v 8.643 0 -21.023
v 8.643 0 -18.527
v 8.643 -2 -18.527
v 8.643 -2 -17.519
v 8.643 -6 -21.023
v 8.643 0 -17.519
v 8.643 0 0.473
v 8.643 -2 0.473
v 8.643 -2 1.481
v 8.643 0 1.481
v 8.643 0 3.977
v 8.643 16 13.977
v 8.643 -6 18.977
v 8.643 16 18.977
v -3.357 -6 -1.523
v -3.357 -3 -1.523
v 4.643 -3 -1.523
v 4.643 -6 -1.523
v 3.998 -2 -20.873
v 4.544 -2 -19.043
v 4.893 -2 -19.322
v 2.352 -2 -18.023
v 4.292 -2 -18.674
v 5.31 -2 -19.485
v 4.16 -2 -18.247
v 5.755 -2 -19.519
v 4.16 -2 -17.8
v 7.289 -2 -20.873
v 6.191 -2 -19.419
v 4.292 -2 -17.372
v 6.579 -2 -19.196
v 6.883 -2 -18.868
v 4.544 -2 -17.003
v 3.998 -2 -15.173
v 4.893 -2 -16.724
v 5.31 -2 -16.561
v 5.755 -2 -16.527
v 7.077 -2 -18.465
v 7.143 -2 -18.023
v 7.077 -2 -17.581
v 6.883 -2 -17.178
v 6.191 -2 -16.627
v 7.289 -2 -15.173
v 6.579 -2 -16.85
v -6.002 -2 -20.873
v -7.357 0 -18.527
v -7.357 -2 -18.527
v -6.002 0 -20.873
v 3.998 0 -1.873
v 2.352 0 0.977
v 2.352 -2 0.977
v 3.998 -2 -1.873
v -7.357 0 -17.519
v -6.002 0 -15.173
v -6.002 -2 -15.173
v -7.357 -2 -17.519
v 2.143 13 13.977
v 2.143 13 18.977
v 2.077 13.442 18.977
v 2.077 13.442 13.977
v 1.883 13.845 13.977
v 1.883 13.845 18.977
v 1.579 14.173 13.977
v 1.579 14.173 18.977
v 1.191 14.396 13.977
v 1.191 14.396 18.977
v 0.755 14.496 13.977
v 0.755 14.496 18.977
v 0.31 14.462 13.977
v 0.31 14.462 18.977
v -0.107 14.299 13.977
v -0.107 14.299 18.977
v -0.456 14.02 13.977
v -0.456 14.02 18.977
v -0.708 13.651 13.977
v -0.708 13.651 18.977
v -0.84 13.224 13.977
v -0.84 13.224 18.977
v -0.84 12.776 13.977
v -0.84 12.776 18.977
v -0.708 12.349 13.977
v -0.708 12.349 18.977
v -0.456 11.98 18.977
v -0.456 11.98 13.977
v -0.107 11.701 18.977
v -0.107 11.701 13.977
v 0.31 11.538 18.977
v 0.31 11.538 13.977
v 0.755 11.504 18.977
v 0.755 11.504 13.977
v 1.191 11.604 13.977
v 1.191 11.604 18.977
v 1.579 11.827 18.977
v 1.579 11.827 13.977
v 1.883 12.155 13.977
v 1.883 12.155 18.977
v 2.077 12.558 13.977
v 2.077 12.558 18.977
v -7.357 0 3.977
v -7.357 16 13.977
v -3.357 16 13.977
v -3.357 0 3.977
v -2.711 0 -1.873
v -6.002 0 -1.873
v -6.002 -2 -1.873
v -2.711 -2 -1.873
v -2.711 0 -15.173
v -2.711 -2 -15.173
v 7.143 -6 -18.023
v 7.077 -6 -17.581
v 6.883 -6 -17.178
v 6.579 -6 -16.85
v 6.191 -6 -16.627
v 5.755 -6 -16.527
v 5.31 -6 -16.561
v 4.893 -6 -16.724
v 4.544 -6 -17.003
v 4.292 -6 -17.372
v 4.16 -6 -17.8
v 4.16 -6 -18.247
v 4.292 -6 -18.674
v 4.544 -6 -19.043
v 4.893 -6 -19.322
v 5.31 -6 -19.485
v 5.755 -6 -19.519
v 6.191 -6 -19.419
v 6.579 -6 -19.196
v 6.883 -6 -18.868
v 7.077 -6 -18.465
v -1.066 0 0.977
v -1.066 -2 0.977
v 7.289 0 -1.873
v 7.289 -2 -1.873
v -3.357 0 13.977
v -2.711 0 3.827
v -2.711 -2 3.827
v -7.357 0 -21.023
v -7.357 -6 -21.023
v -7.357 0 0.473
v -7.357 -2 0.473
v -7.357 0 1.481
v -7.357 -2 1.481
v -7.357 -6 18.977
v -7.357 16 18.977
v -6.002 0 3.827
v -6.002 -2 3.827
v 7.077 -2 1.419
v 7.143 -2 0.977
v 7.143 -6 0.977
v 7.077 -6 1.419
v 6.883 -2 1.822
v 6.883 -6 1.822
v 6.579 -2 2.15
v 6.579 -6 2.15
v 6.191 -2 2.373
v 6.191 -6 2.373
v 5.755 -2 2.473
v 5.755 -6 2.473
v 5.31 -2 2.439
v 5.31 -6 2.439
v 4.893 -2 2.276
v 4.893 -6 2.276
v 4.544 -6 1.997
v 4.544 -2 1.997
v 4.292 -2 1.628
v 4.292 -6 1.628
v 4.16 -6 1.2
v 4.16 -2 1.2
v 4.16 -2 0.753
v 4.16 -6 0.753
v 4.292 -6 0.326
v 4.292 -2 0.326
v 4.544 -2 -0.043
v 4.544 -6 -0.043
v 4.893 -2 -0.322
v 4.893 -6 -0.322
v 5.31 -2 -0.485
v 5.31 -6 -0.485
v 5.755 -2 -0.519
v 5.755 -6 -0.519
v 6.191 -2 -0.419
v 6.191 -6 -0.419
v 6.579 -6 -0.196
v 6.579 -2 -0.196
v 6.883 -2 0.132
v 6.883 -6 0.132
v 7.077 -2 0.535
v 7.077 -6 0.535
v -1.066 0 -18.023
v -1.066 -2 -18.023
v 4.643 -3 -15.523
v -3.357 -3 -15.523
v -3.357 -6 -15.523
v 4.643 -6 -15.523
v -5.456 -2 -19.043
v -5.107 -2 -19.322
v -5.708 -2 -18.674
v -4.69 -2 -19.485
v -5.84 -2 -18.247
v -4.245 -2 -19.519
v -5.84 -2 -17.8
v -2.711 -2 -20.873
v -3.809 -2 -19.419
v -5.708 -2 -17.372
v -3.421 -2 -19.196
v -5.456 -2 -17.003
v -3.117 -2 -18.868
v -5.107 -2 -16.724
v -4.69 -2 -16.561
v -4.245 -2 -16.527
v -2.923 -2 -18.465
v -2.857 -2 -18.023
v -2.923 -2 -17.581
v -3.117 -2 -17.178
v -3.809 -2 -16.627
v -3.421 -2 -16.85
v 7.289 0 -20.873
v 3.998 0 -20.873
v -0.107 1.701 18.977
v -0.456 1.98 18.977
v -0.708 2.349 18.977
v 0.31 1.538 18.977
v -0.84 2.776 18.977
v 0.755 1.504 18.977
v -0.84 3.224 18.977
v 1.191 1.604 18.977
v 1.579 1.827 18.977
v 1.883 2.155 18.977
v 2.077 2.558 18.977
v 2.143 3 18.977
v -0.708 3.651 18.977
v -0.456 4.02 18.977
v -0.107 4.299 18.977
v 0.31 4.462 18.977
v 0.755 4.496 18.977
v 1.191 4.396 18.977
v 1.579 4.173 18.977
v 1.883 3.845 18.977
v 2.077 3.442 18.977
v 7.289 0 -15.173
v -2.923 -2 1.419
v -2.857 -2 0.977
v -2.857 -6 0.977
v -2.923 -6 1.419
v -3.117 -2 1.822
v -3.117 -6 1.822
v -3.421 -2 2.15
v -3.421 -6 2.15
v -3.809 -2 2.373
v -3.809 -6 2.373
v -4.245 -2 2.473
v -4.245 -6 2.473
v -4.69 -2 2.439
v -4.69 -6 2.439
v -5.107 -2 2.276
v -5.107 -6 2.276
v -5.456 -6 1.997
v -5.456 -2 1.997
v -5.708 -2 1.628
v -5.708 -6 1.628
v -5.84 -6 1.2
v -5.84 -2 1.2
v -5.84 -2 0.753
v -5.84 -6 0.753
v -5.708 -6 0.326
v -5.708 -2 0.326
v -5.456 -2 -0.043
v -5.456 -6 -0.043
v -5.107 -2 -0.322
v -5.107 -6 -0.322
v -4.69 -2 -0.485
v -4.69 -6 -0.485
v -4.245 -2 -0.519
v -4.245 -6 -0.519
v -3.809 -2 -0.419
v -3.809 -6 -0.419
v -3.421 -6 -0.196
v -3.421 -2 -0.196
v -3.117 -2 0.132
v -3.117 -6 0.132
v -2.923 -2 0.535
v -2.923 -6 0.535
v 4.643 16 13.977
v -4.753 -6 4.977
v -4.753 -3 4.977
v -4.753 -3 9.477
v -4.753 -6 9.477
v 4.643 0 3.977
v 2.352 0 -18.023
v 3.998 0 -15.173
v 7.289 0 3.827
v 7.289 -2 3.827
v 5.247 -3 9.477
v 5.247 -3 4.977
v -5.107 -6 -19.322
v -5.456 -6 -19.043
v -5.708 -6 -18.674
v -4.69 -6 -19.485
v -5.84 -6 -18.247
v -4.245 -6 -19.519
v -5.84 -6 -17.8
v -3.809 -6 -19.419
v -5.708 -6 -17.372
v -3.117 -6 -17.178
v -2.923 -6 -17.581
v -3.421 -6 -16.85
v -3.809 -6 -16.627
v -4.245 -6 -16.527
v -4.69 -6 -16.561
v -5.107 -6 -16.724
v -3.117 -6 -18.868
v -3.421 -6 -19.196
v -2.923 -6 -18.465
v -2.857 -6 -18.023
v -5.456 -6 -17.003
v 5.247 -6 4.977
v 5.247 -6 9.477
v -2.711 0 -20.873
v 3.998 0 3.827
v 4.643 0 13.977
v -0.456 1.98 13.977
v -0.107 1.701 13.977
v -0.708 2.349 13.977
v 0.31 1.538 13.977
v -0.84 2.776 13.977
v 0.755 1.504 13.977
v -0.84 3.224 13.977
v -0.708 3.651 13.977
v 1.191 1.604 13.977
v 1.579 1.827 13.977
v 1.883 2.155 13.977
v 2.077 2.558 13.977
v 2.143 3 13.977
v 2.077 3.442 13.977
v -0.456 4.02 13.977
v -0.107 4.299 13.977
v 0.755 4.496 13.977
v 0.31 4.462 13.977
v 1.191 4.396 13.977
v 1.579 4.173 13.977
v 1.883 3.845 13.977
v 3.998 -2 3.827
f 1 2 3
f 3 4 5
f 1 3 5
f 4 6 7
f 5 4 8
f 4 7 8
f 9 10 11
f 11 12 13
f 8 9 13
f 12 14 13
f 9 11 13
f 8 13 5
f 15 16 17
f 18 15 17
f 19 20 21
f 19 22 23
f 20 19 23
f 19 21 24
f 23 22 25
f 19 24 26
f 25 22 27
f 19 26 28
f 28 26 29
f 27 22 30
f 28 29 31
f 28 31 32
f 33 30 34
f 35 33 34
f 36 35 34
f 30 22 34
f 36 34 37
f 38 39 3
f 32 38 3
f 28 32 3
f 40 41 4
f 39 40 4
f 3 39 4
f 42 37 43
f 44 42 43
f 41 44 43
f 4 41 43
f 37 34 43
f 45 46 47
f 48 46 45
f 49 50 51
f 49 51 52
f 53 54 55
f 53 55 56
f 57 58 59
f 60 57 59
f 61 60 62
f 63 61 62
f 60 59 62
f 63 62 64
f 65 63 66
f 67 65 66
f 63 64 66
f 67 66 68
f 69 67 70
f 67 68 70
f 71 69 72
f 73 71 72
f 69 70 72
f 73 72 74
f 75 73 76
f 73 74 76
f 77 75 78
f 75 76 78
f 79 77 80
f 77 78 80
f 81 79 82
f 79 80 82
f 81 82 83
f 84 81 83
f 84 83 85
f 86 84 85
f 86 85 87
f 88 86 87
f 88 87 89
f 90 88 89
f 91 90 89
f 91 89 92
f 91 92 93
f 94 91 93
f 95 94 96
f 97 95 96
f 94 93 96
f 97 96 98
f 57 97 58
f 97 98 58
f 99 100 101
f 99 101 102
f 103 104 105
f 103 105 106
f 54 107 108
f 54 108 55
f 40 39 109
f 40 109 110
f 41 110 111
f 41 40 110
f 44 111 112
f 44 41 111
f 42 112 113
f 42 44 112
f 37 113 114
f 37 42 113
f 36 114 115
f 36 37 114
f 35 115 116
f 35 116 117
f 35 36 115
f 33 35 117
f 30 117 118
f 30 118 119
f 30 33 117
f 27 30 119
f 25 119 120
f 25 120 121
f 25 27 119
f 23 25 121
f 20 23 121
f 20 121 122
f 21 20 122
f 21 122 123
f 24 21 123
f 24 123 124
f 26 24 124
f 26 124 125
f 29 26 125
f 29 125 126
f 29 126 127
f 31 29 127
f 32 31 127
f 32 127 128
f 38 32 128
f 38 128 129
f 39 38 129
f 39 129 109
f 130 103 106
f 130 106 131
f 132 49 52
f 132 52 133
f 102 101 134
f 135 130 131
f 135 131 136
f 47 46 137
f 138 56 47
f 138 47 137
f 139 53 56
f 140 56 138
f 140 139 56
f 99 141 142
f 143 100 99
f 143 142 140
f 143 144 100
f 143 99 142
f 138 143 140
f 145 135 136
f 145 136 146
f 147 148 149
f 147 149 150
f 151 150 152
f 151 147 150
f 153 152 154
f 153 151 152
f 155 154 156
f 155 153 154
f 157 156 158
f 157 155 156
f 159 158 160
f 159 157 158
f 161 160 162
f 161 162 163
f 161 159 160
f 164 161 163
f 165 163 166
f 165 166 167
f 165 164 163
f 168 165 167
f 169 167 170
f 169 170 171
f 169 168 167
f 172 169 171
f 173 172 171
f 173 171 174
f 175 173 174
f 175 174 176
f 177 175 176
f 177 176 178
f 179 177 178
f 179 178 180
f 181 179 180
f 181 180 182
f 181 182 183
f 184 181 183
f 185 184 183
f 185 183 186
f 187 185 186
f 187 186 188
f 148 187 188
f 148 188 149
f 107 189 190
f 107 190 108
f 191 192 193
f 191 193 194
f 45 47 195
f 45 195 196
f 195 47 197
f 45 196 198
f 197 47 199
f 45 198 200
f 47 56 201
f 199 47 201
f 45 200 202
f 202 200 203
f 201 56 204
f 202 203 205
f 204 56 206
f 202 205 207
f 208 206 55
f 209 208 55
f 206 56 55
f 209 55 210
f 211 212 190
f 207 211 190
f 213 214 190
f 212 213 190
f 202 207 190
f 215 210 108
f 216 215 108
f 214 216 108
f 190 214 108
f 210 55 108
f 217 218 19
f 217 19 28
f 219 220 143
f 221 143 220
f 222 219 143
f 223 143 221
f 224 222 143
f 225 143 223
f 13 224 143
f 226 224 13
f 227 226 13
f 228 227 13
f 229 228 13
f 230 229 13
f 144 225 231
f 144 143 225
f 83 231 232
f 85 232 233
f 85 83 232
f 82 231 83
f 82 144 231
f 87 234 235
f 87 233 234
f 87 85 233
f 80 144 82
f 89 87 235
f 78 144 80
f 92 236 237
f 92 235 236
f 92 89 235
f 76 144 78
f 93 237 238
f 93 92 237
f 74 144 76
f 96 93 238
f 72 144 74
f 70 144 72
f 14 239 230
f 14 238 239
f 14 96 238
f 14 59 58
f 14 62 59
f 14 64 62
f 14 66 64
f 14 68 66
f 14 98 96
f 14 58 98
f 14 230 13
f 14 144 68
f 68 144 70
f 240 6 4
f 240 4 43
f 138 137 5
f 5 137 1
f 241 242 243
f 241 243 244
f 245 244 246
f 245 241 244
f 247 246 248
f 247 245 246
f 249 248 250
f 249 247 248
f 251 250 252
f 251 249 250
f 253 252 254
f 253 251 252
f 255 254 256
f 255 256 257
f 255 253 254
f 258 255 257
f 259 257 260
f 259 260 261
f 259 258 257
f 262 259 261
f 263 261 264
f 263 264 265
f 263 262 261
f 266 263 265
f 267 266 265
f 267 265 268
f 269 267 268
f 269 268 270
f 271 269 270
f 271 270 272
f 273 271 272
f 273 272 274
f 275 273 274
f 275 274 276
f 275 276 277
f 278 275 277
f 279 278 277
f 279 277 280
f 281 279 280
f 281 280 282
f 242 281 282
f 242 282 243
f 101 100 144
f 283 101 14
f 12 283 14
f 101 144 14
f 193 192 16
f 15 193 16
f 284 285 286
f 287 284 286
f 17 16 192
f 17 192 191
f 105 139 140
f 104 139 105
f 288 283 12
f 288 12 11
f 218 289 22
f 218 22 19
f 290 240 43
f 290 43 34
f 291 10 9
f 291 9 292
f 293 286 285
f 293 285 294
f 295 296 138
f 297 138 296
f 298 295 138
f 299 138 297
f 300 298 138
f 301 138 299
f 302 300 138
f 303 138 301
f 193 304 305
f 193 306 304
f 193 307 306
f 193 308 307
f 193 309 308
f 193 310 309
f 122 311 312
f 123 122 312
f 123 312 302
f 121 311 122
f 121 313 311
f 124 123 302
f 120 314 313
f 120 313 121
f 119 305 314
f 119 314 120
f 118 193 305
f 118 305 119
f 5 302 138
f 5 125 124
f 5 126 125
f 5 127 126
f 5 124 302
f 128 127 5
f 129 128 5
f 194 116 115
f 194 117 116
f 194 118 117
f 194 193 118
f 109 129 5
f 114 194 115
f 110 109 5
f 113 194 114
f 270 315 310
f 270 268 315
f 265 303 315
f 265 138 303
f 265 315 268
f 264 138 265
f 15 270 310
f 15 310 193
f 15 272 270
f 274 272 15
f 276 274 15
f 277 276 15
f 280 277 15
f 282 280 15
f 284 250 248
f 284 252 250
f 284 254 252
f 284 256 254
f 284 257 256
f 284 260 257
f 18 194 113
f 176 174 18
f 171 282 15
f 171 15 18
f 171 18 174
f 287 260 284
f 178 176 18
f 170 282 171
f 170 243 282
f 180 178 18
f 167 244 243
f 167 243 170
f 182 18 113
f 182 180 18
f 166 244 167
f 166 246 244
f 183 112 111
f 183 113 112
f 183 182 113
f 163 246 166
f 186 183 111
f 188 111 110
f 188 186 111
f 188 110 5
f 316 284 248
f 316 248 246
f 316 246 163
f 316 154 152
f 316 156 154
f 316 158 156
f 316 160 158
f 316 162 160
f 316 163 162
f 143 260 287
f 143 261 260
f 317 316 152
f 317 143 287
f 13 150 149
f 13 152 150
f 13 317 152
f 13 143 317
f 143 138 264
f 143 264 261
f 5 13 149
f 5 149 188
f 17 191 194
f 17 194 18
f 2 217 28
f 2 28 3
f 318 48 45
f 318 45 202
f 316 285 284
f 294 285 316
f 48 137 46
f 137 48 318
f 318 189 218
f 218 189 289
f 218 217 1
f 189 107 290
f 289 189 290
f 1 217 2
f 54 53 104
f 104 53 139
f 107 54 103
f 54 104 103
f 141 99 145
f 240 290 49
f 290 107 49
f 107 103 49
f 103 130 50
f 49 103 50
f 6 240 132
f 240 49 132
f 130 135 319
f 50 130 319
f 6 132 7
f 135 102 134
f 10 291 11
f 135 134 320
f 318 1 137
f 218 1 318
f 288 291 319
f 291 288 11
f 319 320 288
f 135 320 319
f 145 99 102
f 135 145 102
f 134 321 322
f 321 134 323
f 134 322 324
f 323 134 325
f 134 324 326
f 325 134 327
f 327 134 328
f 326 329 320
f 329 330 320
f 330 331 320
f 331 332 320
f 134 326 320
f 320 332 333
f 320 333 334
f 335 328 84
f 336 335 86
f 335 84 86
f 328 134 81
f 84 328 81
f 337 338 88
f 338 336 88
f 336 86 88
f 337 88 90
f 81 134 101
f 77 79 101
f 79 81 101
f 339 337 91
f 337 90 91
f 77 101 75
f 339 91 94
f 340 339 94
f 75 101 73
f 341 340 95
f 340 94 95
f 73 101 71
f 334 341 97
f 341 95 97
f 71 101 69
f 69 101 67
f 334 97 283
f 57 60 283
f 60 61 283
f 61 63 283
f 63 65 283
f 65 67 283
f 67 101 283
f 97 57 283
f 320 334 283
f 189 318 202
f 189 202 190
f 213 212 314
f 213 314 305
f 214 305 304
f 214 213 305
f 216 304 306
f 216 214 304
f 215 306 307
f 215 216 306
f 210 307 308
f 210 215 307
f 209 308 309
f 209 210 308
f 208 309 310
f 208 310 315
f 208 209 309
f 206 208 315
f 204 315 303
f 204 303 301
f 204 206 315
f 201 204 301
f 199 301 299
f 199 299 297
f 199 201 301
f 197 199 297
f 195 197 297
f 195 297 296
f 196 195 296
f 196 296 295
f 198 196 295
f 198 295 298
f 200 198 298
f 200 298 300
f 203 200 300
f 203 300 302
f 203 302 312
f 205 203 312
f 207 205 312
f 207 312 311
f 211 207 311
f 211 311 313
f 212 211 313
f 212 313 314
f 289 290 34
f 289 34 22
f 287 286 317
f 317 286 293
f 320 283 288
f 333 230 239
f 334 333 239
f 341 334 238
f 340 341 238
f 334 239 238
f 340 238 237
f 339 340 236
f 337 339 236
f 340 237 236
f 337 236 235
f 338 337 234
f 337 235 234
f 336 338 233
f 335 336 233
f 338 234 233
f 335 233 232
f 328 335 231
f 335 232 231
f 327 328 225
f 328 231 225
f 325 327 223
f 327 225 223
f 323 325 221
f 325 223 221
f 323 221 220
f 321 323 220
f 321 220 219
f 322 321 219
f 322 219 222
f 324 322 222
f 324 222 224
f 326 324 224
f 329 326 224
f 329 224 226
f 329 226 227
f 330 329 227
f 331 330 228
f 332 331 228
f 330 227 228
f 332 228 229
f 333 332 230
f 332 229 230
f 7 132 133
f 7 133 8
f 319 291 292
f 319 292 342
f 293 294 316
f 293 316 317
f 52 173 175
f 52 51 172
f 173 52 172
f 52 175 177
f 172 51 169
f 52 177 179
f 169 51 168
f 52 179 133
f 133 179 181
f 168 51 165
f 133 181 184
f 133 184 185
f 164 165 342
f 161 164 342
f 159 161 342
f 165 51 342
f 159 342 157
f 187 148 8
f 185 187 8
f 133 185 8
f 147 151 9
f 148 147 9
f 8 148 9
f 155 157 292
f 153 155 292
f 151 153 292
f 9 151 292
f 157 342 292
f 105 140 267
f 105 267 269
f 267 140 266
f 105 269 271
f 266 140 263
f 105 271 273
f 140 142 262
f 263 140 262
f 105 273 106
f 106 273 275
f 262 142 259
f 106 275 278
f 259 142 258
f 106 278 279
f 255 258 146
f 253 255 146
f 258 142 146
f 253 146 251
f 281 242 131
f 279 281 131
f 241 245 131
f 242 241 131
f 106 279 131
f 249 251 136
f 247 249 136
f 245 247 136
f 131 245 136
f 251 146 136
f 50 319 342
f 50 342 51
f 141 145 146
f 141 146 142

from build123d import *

# Parameters (mm, degrees)
F0_W      = 16
F0_H      = 40
F0_R      = 1.5
F0_W_2    = 8
F0_H_2    = 14
F0_W_3    = 10
F0_H_3    = 4.5
F1_DEPTH  = 6
F2_DEPTH  = 3
F3_W      = 16
F3_H      = 16
F3_R      = 1.5
F4_DEPTH  = 5
F7_DEPTH  = 2
F9_DEPTH  = 4
F10_START = -12
F10_DEPTH = 4


with BuildPart() as f1:
    # F0 (on Front) → F1 (new body)
    with BuildSketch(Plane.XZ):
        with Locations((0.6433322058, -1.0231063997)):
            Rectangle(F0_W, F0_H)
        with Locations((-4.3566677942, -18.0231063997)):
            Circle(F0_R, mode=Mode.SUBTRACT)
        with Locations((0.6433322058, -8.5231063997)):
            Rectangle(F0_W_2, F0_H_2, mode=Mode.SUBTRACT)
        with Locations((5.6433322058, -18.0231063997)):
            Circle(F0_R, mode=Mode.SUBTRACT)
        with Locations((-4.3566677942, 0.9768936003)):
            Circle(F0_R, mode=Mode.SUBTRACT)
        with Locations((0.246625971, 7.2268936003)):
            Rectangle(F0_W_3, F0_H_3, mode=Mode.SUBTRACT)
        with Locations((5.6433322058, 0.9768936003)):
            Circle(F0_R, mode=Mode.SUBTRACT)
    extrude(amount=F1_DEPTH)

    # F0 (on Front) → F2 (join)
    with BuildSketch(Plane.XZ):
        with Locations((0.246625971, 7.2268936003)):
            Rectangle(F0_W_3, F0_H_3)
        with Locations((0.6433322058, -8.5231063997)):
            Rectangle(F0_W_2, F0_H_2)
    extrude(amount=F2_DEPTH)

    # F3 (on face) → F4 (join)
    with BuildSketch(Plane.XY.offset(18.9768936003)):
        with Locations((0.6433322058, 8)):
            Rectangle(F3_W, F3_H)
        with Locations((0.6433322058, 3)):
            Circle(F3_R, mode=Mode.SUBTRACT)
        with Locations((0.6433322058, 13)):
            Circle(F3_R, mode=Mode.SUBTRACT)
    extrude(amount=-F4_DEPTH)

    # F6 (on face) → F7 (cut)
    with BuildSketch(Plane.XZ):
        Polygon((7.288780473, 3.8268936003), (3.9978839386, 3.8268936003), (2.3524356714, 0.9768936003), (3.9978839386, -1.8731063997), (7.288780473, -1.8731063997), (8.9342287402, 0.9768936003), align=None)
        Polygon((-2.711219527, 3.8268936003), (-6.0021160614, 3.8268936003), (-7.6475643286, 0.9768936003), (-6.0021160614, -1.8731063997), (-2.711219527, -1.8731063997), (-1.0657712598, 0.9768936003), align=None)
        Polygon((-2.711219527, -15.1731063997), (-6.0021160614, -15.1731063997), (-7.6475643286, -18.0231063997), (-6.0021160614, -20.8731063997), (-2.711219527, -20.8731063997), (-1.0657712598, -18.0231063997), align=None)
        Polygon((7.288780473, -15.1731063997), (3.9978839386, -15.1731063997), (2.3524356714, -18.0231063997), (3.9978839386, -20.8731063997), (7.288780473, -20.8731063997), (8.9342287402, -18.0231063997), align=None)
    extrude(amount=F7_DEPTH, mode=Mode.SUBTRACT)

    # F8 (on face) → F9 (join)
    with BuildSketch(Plane(origin=(-7.3566677942, 0, 0), x_dir=(0, -1, 0), z_dir=(-1, 0, 0))):
        Polygon((-16, 13.9768936003), (0, 3.9768936003), (0, 13.9768936003), align=None)
    extrude(amount=-F9_DEPTH)

    # F8 (on face) → F10 (join)
    with BuildSketch(Plane(origin=(-7.3566677942, 0, 0), x_dir=(0, -1, 0), z_dir=(-1, 0, 0)).offset(F10_START)):
        Polygon((-16, 13.9768936003), (0, 3.9768936003), (0, 13.9768936003), align=None)
    extrude(amount=-F10_DEPTH)


solid = f1.part
